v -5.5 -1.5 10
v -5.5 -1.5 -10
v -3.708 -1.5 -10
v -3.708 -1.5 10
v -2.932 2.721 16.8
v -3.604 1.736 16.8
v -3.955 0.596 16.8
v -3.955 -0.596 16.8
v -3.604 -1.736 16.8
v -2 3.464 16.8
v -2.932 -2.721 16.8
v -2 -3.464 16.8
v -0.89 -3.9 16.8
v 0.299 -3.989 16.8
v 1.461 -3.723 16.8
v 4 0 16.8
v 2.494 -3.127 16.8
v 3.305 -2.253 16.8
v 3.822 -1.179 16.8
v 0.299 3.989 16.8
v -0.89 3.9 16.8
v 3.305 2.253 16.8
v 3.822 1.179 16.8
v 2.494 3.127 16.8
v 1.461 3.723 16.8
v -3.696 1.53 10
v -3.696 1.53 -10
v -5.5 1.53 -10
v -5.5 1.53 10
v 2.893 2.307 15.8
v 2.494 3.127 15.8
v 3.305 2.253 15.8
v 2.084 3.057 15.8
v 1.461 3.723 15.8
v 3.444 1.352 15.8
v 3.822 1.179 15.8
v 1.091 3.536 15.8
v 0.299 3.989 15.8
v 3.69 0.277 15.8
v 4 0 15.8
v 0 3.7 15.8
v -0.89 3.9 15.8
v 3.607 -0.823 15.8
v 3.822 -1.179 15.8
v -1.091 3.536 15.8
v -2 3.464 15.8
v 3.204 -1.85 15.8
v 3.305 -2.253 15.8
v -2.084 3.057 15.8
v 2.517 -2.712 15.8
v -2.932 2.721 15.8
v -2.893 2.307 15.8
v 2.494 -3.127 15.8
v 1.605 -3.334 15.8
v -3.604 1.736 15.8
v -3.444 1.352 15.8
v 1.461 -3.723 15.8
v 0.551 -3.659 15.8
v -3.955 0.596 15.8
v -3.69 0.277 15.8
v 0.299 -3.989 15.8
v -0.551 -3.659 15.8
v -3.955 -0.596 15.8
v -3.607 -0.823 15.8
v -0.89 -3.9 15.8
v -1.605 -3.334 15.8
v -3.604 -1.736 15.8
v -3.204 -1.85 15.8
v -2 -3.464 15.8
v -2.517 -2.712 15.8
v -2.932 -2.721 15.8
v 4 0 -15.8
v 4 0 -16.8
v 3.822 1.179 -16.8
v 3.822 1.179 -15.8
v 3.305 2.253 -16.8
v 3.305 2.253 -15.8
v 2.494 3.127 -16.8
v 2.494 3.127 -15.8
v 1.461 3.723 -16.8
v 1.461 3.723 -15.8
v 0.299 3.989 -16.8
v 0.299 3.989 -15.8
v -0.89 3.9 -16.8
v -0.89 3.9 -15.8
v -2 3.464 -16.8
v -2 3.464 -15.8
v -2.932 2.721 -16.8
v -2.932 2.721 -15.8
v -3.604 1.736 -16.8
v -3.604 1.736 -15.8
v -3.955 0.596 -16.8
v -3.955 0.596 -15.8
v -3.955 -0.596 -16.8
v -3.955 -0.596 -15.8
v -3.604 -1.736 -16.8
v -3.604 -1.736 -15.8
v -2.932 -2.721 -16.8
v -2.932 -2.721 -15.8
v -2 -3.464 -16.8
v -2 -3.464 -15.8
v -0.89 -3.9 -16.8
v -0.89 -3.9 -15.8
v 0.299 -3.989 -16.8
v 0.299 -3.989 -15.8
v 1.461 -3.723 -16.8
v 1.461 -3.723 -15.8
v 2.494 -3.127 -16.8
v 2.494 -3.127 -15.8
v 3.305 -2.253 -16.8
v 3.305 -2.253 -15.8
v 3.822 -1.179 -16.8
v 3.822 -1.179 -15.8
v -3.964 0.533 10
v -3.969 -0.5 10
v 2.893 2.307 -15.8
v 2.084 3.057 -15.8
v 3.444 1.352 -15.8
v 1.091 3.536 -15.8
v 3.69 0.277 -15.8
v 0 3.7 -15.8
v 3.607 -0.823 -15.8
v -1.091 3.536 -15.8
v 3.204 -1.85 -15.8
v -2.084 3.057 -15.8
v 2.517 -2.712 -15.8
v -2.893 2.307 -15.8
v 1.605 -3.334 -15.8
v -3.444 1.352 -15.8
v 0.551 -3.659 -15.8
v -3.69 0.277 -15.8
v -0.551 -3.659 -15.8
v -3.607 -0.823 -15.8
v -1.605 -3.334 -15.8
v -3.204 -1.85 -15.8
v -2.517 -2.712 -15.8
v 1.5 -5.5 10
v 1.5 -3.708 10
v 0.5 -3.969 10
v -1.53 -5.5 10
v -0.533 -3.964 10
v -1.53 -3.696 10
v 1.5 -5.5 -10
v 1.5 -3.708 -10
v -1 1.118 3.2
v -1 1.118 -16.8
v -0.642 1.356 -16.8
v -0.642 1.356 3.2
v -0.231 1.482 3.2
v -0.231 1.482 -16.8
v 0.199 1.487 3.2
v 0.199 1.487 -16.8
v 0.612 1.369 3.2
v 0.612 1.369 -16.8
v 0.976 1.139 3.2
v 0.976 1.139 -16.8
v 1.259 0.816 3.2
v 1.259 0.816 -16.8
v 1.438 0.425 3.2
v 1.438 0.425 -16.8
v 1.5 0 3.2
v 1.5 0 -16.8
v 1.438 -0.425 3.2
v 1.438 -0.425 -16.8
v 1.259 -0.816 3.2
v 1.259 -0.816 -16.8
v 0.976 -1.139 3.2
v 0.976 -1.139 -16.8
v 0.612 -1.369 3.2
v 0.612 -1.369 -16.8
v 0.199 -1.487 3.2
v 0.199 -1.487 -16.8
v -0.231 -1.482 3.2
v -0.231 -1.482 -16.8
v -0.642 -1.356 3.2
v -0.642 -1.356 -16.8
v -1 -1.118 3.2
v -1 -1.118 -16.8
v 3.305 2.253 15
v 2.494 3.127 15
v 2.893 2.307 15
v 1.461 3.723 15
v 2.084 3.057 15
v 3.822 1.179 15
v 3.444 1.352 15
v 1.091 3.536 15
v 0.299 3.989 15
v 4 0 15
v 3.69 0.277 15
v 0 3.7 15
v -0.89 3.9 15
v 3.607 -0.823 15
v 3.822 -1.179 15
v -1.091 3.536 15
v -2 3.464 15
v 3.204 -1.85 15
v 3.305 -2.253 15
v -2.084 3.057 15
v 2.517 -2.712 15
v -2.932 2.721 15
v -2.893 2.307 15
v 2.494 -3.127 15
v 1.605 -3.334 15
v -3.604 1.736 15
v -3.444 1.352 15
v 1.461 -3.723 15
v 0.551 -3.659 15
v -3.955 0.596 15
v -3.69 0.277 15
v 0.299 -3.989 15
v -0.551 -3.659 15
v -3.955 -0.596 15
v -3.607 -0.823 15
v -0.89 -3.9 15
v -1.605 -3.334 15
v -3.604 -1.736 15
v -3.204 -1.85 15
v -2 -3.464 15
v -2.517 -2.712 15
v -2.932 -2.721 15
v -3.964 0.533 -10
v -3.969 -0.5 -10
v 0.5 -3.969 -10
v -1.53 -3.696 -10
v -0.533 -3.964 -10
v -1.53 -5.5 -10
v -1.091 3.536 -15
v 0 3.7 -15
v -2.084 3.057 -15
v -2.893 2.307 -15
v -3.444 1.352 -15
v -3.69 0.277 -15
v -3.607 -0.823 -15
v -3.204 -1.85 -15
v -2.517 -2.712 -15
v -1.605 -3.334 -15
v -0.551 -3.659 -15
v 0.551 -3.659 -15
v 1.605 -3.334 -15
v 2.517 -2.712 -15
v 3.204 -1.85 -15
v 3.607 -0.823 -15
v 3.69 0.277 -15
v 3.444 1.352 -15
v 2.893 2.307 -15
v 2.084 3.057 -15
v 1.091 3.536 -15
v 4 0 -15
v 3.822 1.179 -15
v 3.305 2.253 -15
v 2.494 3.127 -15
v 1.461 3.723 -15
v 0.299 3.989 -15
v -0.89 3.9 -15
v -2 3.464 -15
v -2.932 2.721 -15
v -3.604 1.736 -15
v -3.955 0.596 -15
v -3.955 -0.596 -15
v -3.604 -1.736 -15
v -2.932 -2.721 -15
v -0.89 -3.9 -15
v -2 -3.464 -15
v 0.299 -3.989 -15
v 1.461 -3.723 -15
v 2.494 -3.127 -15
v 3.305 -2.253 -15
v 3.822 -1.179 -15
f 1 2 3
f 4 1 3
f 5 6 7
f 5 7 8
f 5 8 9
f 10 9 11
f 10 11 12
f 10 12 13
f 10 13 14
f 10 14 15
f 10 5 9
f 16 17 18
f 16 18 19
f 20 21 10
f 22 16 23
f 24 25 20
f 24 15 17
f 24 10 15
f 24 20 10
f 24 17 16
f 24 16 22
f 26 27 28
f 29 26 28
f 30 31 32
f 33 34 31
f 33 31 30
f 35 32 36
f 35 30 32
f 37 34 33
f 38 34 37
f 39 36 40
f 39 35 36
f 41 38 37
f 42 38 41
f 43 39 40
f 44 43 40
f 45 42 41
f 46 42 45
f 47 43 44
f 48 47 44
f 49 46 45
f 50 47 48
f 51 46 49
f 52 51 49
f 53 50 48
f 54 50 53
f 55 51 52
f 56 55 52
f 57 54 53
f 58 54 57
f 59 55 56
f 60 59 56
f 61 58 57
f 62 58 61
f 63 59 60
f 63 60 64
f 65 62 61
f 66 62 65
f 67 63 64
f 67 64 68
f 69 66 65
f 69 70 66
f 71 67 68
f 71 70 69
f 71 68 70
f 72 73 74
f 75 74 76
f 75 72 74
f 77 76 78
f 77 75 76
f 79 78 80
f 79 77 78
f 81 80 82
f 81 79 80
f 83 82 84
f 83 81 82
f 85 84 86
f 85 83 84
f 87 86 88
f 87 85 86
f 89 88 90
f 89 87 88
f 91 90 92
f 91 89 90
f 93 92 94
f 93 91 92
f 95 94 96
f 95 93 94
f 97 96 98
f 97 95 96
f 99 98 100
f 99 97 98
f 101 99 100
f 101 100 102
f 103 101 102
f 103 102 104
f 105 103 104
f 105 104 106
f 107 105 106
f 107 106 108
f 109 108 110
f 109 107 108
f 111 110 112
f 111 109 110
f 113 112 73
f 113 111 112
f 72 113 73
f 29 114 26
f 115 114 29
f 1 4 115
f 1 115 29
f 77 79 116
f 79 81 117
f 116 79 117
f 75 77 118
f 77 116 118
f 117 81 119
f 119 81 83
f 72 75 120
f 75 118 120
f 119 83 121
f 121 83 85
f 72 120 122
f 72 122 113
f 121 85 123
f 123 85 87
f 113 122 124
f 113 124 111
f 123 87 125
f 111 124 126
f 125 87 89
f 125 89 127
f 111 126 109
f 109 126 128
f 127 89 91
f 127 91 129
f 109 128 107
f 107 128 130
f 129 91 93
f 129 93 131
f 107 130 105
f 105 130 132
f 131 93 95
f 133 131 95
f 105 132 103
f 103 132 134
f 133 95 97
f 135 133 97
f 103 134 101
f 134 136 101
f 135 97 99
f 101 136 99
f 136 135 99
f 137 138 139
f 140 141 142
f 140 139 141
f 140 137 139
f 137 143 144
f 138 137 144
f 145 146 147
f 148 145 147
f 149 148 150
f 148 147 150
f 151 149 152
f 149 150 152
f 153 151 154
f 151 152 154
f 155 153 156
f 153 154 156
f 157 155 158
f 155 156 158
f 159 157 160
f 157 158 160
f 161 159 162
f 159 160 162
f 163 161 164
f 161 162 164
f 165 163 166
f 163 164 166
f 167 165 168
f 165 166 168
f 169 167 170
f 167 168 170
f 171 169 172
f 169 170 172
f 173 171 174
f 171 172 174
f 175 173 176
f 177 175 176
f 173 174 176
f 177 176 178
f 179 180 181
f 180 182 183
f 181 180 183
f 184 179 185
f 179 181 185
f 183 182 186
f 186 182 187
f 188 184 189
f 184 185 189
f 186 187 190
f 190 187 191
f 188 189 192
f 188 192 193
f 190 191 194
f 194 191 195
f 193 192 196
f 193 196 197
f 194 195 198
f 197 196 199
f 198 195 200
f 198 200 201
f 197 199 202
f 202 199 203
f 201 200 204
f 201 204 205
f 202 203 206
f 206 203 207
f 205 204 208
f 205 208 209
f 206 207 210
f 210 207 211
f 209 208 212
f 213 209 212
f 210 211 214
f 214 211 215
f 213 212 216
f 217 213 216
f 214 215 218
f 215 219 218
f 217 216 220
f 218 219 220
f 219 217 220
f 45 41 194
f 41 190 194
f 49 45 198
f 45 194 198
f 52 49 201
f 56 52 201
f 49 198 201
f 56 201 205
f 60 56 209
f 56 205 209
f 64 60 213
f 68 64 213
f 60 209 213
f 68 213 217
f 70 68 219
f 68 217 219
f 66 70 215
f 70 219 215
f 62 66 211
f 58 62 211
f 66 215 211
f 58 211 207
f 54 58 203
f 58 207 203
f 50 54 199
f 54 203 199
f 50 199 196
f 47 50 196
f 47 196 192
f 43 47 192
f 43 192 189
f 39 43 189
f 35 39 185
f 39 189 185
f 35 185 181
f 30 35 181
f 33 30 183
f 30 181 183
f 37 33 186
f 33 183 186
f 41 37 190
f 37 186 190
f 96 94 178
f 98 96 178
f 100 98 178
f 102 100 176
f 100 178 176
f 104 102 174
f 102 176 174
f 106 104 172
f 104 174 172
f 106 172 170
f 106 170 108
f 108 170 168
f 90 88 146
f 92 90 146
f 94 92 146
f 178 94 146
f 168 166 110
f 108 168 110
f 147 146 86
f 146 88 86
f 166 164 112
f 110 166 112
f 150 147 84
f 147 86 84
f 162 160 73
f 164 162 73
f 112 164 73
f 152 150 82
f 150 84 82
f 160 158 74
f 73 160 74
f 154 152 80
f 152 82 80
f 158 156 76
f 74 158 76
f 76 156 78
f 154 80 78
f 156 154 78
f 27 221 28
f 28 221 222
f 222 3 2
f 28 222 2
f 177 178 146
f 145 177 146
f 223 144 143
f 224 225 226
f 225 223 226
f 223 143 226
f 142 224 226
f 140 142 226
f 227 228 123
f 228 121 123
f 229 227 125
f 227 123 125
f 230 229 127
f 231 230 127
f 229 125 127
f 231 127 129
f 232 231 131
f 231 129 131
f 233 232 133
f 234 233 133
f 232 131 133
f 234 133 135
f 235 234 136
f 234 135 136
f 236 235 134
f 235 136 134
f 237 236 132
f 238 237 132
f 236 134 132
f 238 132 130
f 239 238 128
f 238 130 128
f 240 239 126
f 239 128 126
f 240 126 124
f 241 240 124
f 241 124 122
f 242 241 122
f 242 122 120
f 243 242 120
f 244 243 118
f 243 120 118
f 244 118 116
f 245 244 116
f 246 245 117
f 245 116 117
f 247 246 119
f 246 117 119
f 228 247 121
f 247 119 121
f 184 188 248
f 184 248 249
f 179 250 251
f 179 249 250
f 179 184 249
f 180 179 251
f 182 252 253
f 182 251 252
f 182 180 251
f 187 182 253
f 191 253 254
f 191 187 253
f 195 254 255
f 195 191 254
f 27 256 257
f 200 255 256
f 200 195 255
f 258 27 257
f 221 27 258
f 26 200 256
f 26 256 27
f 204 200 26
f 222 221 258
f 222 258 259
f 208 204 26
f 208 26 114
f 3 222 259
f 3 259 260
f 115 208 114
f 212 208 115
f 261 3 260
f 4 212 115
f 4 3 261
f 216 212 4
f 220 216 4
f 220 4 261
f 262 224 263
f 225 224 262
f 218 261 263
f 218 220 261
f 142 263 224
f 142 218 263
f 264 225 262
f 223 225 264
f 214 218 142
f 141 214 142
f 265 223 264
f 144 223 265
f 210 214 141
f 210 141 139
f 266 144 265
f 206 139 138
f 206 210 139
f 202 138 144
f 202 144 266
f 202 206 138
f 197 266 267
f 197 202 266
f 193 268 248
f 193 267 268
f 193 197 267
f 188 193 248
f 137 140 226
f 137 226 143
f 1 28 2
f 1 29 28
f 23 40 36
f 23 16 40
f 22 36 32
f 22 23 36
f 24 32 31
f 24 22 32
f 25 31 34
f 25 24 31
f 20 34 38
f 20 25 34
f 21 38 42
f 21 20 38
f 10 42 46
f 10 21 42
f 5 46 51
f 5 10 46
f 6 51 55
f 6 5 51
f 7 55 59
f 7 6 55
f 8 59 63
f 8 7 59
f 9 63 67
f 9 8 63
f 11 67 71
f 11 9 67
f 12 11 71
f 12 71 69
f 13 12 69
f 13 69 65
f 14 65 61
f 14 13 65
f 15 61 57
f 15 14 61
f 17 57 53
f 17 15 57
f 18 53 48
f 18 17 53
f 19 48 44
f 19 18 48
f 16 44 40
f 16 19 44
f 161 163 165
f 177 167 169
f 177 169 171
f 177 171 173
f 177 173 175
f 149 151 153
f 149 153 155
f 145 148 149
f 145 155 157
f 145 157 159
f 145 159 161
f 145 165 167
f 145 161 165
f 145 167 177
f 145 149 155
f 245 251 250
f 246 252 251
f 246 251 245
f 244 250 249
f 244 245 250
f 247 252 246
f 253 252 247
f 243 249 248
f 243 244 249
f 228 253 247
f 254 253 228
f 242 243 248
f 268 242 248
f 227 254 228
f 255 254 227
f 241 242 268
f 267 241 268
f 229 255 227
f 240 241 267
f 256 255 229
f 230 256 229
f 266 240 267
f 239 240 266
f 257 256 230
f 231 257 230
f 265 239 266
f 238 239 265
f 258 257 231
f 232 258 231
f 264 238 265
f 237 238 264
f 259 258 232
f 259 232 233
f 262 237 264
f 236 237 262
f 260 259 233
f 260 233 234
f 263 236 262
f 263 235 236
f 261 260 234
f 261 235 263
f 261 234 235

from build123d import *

# Parameters (mm, degrees)
SKETCH_1_R          = 4
EXTRUDE_1_DEPTH     = 16.8
SKETCH_2_W          = 0.8
SKETCH_2_H          = 0.3
EXTRUDE_2_DEPTH     = 10
CUT_EXTRUDE_1_DEPTH = 20


with BuildPart() as part:
    # 草图1 → 凸台-拉伸1 (new body, symmetric)
    with BuildSketch(Plane.XY):
        Circle(SKETCH_1_R)
    extrude(amount=EXTRUDE_1_DEPTH, both=True)

    # 草图2 → 切除-旋转1 (revolve, cut)
    with BuildSketch(Plane(origin=(0, 0, 0), x_dir=(0, 0, -1), z_dir=(1, 0, 0))):
        with Locations((-15.4, 3.85)):
            Rectangle(SKETCH_2_W, SKETCH_2_H)
        with Locations((15.4, 3.85)):
            Rectangle(SKETCH_2_W, SKETCH_2_H)
    revolve(axis=Axis((0, 0, -18.8), (0, 0, 1)), mode=Mode.SUBTRACT)

    # 草图3 → 凸台-拉伸2 (add, symmetric)
    with BuildSketch(Plane(origin=(0, 0, 0), x_dir=(-1, 0, 0), z_dir=(0, 0, 1))):
        with BuildLine():
            Line((5.5, 1.5), (3.708099, 1.5))
            ThreePointArc((3.708099, 1.5), (2.839864, 2.816943), (1.53, 3.695822))
            Line((1.53, 3.695822), (1.53, 5.5))
            Line((1.53, 5.5), (-1.5, 5.5))
            Line((-1.5, 5.5), (-1.5, 3.708099))
            ThreePointArc((-1.5, 3.708099), (-2.839864, -2.816943), (3.695822, -1.53))
            Line((3.695822, -1.53), (5.5, -1.53))
            Line((5.5, -1.53), (5.5, 1.5))
        make_face()
    extrude(amount=EXTRUDE_2_DEPTH, both=True)

    # 草图4 → 切除-拉伸1 (cut)
    with BuildSketch(Plane(origin=(0, 0, -16.8), x_dir=(-1, 0, 0), z_dir=(0, 0, -1))):
        with BuildLine():
            Line((1, -1.118034), (1, 1.118034))
            ThreePointArc((1, 1.118034), (-1.5, 0), (1, -1.118034))
        make_face()
    extrude(amount=-CUT_EXTRUDE_1_DEPTH, mode=Mode.SUBTRACT)


solid = part.part
